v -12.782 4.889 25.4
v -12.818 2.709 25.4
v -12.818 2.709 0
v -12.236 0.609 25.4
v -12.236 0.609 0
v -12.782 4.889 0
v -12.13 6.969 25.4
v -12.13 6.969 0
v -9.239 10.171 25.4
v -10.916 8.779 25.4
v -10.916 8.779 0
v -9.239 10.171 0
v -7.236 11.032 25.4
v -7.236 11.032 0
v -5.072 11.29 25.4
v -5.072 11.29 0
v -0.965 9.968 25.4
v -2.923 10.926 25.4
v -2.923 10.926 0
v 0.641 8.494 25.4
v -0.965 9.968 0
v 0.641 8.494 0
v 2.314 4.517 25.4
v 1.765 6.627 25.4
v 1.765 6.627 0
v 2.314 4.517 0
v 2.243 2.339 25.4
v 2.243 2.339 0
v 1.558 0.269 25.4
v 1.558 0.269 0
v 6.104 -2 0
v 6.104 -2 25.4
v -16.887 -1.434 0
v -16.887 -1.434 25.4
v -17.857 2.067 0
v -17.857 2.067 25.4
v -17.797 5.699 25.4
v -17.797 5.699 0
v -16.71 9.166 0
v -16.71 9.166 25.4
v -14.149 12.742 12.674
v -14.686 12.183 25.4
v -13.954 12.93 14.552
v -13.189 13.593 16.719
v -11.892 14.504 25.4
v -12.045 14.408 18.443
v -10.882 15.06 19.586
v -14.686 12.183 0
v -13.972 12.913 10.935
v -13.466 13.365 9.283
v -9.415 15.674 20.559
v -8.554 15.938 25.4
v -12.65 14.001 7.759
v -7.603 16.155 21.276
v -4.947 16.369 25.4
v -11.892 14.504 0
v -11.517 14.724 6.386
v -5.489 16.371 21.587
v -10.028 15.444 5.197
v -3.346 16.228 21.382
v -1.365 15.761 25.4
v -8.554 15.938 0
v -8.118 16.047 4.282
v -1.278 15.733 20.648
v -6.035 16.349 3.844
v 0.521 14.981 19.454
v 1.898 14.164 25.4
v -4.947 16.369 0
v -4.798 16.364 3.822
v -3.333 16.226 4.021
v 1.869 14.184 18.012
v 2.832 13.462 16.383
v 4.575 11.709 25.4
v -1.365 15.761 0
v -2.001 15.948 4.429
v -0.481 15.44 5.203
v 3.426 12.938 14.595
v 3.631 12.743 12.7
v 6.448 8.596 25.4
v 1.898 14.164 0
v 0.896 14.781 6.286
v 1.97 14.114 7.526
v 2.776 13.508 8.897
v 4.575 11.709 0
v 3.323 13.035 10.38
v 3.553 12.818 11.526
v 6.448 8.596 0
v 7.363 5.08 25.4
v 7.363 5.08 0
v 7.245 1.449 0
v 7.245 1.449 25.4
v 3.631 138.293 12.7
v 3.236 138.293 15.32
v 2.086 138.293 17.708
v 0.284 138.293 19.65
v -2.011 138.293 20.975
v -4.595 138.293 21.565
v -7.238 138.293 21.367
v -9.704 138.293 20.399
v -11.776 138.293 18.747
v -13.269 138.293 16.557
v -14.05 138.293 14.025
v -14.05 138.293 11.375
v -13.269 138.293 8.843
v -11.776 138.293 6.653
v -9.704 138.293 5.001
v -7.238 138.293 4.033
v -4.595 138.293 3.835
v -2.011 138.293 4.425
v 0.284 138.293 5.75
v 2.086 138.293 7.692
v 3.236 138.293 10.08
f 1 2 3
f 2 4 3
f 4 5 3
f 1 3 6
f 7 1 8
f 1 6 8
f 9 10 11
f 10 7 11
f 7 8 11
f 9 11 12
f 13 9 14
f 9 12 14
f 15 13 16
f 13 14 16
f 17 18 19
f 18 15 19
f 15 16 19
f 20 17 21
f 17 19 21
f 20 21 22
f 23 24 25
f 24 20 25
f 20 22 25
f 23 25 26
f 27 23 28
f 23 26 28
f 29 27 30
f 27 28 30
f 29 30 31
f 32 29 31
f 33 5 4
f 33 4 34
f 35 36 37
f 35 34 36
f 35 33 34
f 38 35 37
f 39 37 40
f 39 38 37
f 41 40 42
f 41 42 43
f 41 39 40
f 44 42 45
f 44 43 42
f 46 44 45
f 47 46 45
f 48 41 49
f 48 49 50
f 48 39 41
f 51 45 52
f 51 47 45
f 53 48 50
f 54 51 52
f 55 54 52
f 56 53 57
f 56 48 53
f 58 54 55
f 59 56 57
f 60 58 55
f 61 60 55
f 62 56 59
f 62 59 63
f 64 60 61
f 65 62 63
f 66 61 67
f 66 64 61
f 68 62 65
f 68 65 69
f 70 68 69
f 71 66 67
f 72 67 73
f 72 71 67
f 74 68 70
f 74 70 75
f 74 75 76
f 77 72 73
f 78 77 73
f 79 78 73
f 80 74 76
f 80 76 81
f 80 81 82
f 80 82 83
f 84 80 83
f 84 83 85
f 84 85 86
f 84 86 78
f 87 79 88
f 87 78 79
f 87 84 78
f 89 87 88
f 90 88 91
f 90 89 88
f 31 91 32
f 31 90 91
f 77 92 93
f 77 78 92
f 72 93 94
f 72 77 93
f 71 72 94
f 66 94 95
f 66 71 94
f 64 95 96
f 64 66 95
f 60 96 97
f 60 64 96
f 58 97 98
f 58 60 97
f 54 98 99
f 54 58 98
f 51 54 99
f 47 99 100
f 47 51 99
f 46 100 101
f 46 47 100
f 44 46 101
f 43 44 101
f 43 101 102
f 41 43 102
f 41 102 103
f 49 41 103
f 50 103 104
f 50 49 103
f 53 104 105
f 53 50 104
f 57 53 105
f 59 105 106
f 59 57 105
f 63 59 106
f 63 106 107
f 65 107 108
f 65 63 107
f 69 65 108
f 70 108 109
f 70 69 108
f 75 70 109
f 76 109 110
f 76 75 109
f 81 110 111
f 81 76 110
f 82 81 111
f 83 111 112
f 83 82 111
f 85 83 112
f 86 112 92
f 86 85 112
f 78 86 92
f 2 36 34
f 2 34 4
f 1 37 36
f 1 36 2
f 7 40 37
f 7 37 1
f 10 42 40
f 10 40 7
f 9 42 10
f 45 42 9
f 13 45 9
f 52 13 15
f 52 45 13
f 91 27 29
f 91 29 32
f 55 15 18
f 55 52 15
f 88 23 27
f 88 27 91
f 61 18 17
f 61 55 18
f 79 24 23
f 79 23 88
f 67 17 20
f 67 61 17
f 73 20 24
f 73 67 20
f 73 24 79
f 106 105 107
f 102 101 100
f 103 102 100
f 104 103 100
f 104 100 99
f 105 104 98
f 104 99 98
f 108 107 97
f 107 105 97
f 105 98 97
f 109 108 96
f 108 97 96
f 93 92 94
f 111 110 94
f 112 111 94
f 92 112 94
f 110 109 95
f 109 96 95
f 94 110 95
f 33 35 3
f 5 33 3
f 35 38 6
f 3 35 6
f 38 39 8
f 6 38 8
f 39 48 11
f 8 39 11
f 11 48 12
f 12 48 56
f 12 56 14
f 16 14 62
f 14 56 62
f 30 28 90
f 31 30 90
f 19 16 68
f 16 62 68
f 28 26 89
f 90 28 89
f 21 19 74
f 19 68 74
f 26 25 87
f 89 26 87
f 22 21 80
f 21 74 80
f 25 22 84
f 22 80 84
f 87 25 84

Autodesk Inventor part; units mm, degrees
ref_plane "YZ Plane" through (0, 0, 0) normal (1, 0, 0) x (0, 1, 0)
ref_plane "XZ Plane" through (0, 0, 0) normal (0, 1, 0) x (-1, 0, 0)
ref_plane "XY Plane" through (0, 0, 0) normal (0, 0, 1) x (1, 0, 0)
sketch "Sketch1" plane through (0, 0, 0) normal (0, 0, 1) x (1, 0, 0)
  arc A0 (6.1036, -1.9996) -> (-16.8874, -1.4338) centre (-5.2593, 3.6728) ccw
  arc A1 (1.5584, 0.2694) -> (-12.2361, 0.6088) centre (-5.2593, 3.6728) ccw
  line L0 (-12.2361, 0.6088) -> (-16.8874, -1.4338)
  line L1 (1.5584, 0.2694) -> (6.1036, -1.9996)
  point P0 (0, 0)
  dimension "d0" = 25.4
  dimension "d1" = 15.24
extrude "Extrusion1" add sketch "Sketch1" along normal blind 25.4
sketch "Sketch2" plane through (0, 0, 25.4) normal (0, 0, 1) x (1, 0, 0)
  arc A0 (6.1036, -1.9996) -> (-16.8874, -1.4338) centre (-5.2593, 3.6728) ccw projected
  line L0 (-5.2593, 16.3728) -> (1.9559, 16.3728) construction
  arc A1 (1.5584, 0.2694) -> (-12.2361, 0.6088) centre (-5.2593, 3.6728) ccw projected
  line L1 (-5.2593, 11.2928) -> (0.7923, 11.2928) construction
  point P0 (0, 0)
  point P1 (-12.1004, 0.3168)
  point P2 (1.2826, -0.2347)
ref_plane "Work Plane2" through (-5.2593, 11.2928, 25.4) normal (0, -1, 0) x (1, 0, 0)
sketch "Sketch3" plane through (-5.2593, 11.2928, 25.4) normal (0, -1, 0) x (1, 0, 0)
  line L0 (12.7, 0) -> (-12.7, 0) projected
  line L1 (-12.7, -25.4) -> (12.7, -25.4) projected
  line L2 (-12.7, 0) -> (12.7, -25.4) construction
  line L3 (12.7, 0) -> (-12.7, -25.4) construction
  circle A0 centre (0, -12.7) radius 8.89
  point P0 (5.2593, -25.4)
  point P1 (11.3628, 0)
  point P2 (-11.6281, 0)
  point P3 (11.3628, -25.4)
  point P4 (-11.6281, -25.4)
  dimension "d4" = 17.78
extrude "Extrusion2" add sketch "Sketch3" against normal blind 127
properties part number "golf1"
